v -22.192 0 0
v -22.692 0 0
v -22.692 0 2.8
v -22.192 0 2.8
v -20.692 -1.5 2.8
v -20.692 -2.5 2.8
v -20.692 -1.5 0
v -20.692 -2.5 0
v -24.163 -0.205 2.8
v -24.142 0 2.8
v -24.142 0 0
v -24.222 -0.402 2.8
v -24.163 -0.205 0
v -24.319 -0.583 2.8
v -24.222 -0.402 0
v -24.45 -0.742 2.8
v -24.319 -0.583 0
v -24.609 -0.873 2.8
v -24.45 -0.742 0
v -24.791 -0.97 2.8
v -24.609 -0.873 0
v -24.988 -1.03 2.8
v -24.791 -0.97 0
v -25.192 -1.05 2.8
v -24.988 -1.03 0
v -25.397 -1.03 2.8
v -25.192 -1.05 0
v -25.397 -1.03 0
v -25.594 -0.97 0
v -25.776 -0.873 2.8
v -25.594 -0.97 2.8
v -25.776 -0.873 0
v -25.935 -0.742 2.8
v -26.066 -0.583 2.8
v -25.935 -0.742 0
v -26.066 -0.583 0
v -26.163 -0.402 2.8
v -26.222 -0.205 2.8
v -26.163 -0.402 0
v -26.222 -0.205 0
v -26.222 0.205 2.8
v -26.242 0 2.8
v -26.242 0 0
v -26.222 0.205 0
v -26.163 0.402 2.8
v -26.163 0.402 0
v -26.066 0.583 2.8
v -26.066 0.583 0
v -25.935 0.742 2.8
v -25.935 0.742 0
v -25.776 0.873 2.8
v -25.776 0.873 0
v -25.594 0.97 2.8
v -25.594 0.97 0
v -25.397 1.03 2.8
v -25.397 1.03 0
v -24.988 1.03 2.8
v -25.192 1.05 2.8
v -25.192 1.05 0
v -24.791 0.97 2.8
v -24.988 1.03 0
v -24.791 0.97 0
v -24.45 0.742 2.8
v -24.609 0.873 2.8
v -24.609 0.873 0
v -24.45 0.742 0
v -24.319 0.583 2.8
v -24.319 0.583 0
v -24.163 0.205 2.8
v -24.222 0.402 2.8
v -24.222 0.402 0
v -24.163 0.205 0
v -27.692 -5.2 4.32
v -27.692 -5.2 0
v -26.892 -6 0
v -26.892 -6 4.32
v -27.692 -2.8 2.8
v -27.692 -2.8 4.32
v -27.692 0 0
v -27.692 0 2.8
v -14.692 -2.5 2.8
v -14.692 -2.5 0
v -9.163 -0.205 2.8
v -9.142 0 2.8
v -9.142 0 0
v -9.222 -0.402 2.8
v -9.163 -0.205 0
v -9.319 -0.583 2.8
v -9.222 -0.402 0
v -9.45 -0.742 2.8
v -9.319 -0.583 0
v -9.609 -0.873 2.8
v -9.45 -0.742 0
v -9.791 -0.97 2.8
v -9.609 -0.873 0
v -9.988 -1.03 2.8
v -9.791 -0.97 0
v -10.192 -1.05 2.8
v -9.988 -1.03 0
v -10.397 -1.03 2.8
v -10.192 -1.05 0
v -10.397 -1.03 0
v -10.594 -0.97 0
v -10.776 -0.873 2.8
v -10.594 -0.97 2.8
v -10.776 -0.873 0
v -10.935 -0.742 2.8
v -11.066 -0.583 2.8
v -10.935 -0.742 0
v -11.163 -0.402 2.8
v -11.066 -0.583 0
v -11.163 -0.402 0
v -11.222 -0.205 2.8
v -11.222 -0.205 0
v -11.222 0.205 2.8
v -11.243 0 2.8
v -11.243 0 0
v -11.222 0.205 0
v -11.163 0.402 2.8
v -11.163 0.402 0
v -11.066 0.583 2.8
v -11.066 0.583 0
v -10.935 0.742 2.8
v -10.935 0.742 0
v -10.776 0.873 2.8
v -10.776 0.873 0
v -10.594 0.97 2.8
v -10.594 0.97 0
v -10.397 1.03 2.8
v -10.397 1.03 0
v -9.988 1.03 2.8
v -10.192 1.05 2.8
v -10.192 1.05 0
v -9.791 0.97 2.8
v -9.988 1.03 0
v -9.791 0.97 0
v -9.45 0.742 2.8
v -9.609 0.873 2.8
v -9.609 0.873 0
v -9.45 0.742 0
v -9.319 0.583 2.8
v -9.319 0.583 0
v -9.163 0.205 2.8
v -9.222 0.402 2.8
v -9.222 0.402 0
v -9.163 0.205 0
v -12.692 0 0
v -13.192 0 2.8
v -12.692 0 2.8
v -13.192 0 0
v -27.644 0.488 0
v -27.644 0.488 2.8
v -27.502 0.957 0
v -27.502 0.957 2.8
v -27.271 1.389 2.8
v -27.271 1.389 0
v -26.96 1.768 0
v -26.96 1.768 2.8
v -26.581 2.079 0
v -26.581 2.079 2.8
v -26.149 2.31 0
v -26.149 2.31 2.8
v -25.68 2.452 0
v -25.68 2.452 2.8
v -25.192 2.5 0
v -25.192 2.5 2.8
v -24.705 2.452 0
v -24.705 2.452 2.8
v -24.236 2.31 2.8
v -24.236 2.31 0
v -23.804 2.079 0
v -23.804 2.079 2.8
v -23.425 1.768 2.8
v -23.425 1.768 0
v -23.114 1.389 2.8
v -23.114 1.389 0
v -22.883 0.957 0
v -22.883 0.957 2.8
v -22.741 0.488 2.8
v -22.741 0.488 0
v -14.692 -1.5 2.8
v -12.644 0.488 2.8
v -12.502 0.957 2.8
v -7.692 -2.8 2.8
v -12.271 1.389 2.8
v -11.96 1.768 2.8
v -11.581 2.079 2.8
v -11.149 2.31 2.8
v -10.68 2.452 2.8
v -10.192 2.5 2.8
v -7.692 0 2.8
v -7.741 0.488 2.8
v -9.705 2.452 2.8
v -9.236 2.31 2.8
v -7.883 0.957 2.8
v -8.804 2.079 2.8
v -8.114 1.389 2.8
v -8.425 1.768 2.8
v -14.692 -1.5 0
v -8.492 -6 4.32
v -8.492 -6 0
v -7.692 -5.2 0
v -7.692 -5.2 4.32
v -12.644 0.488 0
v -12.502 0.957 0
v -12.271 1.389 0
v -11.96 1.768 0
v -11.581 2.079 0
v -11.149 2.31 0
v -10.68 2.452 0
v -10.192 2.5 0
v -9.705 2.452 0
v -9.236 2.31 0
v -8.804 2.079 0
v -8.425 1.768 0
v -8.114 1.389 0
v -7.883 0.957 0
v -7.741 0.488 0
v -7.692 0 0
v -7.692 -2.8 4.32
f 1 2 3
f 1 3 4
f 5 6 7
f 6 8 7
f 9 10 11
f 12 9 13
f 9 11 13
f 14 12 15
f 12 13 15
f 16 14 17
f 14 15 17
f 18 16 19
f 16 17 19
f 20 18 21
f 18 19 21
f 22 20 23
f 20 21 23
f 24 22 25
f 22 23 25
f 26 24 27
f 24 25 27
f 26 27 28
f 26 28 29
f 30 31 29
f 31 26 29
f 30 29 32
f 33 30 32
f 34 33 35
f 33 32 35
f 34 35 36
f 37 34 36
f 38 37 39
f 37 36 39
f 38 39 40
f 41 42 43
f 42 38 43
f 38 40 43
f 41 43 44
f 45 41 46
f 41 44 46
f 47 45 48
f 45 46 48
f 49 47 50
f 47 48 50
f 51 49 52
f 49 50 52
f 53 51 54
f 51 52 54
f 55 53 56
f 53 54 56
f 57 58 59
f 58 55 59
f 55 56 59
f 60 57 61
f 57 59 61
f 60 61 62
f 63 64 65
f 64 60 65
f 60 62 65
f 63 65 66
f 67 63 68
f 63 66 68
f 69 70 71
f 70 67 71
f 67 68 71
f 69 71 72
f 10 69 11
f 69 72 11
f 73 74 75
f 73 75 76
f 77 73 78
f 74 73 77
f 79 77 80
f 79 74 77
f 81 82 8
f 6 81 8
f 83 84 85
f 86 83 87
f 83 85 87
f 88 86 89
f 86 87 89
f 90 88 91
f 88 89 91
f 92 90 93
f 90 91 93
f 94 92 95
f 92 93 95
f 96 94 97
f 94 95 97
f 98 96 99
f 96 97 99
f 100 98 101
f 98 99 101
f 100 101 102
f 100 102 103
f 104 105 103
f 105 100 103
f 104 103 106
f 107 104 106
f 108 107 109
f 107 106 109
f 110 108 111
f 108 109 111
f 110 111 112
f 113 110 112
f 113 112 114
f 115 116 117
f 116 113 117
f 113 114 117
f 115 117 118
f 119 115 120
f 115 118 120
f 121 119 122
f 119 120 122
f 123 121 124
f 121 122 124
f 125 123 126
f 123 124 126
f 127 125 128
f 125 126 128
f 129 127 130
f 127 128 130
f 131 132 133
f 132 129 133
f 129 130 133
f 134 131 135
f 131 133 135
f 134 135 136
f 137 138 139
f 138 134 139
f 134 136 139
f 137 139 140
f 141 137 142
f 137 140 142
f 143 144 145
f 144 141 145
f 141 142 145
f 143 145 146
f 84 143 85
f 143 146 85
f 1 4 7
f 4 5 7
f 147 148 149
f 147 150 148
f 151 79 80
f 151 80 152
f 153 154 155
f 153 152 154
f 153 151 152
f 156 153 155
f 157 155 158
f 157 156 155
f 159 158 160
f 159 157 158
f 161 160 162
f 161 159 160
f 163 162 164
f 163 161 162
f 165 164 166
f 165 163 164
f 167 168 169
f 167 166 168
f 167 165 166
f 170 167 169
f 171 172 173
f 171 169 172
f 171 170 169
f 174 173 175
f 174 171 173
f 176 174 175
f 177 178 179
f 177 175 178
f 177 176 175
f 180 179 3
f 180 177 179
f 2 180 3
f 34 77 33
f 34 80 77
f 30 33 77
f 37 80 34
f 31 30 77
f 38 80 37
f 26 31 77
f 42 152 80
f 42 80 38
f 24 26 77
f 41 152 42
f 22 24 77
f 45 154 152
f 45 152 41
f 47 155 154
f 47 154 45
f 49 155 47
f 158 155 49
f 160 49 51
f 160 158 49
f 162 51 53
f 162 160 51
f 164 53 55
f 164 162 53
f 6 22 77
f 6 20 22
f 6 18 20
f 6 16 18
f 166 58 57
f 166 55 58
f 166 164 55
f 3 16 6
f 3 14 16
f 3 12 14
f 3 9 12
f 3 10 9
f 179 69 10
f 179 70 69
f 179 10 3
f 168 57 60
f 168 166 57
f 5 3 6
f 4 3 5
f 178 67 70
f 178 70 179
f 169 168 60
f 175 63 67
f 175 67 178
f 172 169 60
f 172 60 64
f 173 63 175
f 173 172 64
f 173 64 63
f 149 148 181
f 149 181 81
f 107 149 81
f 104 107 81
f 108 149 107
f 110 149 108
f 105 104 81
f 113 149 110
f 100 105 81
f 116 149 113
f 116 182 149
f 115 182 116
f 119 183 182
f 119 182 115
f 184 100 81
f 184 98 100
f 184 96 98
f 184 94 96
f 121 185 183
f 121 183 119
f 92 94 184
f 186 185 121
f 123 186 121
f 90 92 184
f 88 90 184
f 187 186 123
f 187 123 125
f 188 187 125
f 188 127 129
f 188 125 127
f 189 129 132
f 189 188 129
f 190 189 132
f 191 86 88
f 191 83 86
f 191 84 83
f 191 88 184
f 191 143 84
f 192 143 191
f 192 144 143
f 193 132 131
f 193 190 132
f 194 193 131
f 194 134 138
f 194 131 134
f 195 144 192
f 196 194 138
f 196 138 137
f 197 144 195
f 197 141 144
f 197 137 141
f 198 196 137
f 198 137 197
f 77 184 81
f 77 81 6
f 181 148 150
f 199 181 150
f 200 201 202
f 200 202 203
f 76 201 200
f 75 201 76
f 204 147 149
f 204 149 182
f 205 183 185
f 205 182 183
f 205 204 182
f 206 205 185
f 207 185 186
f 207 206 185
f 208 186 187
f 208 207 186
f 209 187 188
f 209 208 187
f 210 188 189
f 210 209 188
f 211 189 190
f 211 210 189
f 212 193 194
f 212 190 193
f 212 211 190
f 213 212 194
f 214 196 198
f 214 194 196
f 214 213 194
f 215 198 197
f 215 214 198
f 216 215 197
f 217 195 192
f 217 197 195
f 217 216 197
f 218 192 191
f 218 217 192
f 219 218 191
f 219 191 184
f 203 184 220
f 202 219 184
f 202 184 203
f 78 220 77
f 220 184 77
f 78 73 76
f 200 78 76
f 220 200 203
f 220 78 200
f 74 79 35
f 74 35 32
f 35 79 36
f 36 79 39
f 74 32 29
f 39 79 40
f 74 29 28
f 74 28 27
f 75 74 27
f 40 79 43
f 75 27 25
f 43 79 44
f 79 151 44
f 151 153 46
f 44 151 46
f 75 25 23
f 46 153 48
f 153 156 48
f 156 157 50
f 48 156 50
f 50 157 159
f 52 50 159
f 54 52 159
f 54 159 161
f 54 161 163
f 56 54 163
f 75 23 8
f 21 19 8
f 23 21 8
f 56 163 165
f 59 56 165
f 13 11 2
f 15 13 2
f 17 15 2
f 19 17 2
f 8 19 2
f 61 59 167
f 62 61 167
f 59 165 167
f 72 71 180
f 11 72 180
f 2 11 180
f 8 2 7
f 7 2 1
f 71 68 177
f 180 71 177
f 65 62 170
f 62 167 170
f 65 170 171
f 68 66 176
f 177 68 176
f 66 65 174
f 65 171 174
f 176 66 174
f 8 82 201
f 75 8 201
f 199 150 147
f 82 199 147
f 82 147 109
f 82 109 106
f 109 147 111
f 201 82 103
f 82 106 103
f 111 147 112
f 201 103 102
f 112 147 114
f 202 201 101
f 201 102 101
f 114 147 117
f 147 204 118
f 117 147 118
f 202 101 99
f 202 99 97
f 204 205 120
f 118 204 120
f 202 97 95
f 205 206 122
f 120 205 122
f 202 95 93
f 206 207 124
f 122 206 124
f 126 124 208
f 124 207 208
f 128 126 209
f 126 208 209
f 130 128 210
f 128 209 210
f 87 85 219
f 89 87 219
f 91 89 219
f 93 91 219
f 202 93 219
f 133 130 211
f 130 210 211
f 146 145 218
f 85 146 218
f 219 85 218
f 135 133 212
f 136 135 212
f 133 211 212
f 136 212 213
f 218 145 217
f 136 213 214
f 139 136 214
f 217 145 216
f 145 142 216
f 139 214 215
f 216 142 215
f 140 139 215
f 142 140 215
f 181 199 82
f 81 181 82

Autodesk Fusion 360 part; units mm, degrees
sketch "Sketch1" plane through (0, 0, 0) normal (0, 0, 1) x (1, 0, 0)
  circle A0 centre (-10.1925, 0) radius 2.5
  circle A1 centre (-25.1925, 0) radius 2.5
  circle A2 centre (-25.1925, 0) radius 1.6
  circle A3 centre (-10.1925, 0) radius 1.6
  line L0 (-27.6925, 0) -> (-7.6925, 0)
  line L1 (-7.6925, 0) -> (-7.6925, -6)
  line L2 (-7.6925, -6) -> (-27.6925, -6)
  line L3 (-27.6925, -6) -> (-27.6925, 0)
  line L4 (-27.6925, 0) -> (-22.6925, 0)
  line L5 (-20.6925, 0) -> (-14.6925, 0)
  line L6 (-14.6925, 0) -> (-14.6925, -2.5)
  line L7 (-14.6925, -2.5) -> (-20.6925, -2.5)
  line L8 (-20.6925, -2.5) -> (-20.6925, 0)
  line L9 (-27.6925, 0) -> (-2.5588, 0)
  line L10 (-7.6925, -2.8) -> (-27.6925, -2.8)
  line L11 (-27.6925, -2.8) -> (-27.6925, 0)
  circle A4 centre (-25.1925, 0) radius 1.05
  circle A5 centre (-10.1925, 0) radius 1.05
  dimension "d1" = 5
  dimension "d3" = 5
  dimension "d4" = 15
  dimension "d6" = 3.2
  dimension "d7" = 3.2
  dimension "d10" = 6
  dimension "d11" = 5
  dimension "d13" = 2.5
  dimension "d14" = 2.8
  dimension "d21" = 6
  dimension "d22" = 2.1
  dimension "d23" = 2.1
extrude "Extrude1" add sketch "Sketch1" along normal blind 2.8 contours A0 A3 L0 L9 | A0 A1 L0 L1 L3 L6 L7 L8 L9 L10 L11 | A0 A3 L0 L9 | L1 L2 L3 L10 | A1 A2 L0 L4 L9 | A1 A2 L0 L4 L9
extrude "Extrude2" add sketch "Sketch1" along normal blind 4.32 contours L1 L2 L3 L10
chamfer "Chamfer1" distance 1.5 angle 45 2 edges at (-14.6925, 0, 1.4) (-20.6925, 0, 1.4)
chamfer "Chamfer2" distance 0.8 angle 45 2 edges at (-27.6925, -6, 2.16) (-7.6925, -6, 2.16)
extrude "Extrude3" add sketch "Sketch1" along normal up to surface (2.8 mm away) contours A3 L0 L9 A5 | A3 L0 L9 A5 | A2 L0 L4 L9 A4 | A2 L0 L4 L9 A4
equation "d17 = 2.8 mm + 1.52 mm"
